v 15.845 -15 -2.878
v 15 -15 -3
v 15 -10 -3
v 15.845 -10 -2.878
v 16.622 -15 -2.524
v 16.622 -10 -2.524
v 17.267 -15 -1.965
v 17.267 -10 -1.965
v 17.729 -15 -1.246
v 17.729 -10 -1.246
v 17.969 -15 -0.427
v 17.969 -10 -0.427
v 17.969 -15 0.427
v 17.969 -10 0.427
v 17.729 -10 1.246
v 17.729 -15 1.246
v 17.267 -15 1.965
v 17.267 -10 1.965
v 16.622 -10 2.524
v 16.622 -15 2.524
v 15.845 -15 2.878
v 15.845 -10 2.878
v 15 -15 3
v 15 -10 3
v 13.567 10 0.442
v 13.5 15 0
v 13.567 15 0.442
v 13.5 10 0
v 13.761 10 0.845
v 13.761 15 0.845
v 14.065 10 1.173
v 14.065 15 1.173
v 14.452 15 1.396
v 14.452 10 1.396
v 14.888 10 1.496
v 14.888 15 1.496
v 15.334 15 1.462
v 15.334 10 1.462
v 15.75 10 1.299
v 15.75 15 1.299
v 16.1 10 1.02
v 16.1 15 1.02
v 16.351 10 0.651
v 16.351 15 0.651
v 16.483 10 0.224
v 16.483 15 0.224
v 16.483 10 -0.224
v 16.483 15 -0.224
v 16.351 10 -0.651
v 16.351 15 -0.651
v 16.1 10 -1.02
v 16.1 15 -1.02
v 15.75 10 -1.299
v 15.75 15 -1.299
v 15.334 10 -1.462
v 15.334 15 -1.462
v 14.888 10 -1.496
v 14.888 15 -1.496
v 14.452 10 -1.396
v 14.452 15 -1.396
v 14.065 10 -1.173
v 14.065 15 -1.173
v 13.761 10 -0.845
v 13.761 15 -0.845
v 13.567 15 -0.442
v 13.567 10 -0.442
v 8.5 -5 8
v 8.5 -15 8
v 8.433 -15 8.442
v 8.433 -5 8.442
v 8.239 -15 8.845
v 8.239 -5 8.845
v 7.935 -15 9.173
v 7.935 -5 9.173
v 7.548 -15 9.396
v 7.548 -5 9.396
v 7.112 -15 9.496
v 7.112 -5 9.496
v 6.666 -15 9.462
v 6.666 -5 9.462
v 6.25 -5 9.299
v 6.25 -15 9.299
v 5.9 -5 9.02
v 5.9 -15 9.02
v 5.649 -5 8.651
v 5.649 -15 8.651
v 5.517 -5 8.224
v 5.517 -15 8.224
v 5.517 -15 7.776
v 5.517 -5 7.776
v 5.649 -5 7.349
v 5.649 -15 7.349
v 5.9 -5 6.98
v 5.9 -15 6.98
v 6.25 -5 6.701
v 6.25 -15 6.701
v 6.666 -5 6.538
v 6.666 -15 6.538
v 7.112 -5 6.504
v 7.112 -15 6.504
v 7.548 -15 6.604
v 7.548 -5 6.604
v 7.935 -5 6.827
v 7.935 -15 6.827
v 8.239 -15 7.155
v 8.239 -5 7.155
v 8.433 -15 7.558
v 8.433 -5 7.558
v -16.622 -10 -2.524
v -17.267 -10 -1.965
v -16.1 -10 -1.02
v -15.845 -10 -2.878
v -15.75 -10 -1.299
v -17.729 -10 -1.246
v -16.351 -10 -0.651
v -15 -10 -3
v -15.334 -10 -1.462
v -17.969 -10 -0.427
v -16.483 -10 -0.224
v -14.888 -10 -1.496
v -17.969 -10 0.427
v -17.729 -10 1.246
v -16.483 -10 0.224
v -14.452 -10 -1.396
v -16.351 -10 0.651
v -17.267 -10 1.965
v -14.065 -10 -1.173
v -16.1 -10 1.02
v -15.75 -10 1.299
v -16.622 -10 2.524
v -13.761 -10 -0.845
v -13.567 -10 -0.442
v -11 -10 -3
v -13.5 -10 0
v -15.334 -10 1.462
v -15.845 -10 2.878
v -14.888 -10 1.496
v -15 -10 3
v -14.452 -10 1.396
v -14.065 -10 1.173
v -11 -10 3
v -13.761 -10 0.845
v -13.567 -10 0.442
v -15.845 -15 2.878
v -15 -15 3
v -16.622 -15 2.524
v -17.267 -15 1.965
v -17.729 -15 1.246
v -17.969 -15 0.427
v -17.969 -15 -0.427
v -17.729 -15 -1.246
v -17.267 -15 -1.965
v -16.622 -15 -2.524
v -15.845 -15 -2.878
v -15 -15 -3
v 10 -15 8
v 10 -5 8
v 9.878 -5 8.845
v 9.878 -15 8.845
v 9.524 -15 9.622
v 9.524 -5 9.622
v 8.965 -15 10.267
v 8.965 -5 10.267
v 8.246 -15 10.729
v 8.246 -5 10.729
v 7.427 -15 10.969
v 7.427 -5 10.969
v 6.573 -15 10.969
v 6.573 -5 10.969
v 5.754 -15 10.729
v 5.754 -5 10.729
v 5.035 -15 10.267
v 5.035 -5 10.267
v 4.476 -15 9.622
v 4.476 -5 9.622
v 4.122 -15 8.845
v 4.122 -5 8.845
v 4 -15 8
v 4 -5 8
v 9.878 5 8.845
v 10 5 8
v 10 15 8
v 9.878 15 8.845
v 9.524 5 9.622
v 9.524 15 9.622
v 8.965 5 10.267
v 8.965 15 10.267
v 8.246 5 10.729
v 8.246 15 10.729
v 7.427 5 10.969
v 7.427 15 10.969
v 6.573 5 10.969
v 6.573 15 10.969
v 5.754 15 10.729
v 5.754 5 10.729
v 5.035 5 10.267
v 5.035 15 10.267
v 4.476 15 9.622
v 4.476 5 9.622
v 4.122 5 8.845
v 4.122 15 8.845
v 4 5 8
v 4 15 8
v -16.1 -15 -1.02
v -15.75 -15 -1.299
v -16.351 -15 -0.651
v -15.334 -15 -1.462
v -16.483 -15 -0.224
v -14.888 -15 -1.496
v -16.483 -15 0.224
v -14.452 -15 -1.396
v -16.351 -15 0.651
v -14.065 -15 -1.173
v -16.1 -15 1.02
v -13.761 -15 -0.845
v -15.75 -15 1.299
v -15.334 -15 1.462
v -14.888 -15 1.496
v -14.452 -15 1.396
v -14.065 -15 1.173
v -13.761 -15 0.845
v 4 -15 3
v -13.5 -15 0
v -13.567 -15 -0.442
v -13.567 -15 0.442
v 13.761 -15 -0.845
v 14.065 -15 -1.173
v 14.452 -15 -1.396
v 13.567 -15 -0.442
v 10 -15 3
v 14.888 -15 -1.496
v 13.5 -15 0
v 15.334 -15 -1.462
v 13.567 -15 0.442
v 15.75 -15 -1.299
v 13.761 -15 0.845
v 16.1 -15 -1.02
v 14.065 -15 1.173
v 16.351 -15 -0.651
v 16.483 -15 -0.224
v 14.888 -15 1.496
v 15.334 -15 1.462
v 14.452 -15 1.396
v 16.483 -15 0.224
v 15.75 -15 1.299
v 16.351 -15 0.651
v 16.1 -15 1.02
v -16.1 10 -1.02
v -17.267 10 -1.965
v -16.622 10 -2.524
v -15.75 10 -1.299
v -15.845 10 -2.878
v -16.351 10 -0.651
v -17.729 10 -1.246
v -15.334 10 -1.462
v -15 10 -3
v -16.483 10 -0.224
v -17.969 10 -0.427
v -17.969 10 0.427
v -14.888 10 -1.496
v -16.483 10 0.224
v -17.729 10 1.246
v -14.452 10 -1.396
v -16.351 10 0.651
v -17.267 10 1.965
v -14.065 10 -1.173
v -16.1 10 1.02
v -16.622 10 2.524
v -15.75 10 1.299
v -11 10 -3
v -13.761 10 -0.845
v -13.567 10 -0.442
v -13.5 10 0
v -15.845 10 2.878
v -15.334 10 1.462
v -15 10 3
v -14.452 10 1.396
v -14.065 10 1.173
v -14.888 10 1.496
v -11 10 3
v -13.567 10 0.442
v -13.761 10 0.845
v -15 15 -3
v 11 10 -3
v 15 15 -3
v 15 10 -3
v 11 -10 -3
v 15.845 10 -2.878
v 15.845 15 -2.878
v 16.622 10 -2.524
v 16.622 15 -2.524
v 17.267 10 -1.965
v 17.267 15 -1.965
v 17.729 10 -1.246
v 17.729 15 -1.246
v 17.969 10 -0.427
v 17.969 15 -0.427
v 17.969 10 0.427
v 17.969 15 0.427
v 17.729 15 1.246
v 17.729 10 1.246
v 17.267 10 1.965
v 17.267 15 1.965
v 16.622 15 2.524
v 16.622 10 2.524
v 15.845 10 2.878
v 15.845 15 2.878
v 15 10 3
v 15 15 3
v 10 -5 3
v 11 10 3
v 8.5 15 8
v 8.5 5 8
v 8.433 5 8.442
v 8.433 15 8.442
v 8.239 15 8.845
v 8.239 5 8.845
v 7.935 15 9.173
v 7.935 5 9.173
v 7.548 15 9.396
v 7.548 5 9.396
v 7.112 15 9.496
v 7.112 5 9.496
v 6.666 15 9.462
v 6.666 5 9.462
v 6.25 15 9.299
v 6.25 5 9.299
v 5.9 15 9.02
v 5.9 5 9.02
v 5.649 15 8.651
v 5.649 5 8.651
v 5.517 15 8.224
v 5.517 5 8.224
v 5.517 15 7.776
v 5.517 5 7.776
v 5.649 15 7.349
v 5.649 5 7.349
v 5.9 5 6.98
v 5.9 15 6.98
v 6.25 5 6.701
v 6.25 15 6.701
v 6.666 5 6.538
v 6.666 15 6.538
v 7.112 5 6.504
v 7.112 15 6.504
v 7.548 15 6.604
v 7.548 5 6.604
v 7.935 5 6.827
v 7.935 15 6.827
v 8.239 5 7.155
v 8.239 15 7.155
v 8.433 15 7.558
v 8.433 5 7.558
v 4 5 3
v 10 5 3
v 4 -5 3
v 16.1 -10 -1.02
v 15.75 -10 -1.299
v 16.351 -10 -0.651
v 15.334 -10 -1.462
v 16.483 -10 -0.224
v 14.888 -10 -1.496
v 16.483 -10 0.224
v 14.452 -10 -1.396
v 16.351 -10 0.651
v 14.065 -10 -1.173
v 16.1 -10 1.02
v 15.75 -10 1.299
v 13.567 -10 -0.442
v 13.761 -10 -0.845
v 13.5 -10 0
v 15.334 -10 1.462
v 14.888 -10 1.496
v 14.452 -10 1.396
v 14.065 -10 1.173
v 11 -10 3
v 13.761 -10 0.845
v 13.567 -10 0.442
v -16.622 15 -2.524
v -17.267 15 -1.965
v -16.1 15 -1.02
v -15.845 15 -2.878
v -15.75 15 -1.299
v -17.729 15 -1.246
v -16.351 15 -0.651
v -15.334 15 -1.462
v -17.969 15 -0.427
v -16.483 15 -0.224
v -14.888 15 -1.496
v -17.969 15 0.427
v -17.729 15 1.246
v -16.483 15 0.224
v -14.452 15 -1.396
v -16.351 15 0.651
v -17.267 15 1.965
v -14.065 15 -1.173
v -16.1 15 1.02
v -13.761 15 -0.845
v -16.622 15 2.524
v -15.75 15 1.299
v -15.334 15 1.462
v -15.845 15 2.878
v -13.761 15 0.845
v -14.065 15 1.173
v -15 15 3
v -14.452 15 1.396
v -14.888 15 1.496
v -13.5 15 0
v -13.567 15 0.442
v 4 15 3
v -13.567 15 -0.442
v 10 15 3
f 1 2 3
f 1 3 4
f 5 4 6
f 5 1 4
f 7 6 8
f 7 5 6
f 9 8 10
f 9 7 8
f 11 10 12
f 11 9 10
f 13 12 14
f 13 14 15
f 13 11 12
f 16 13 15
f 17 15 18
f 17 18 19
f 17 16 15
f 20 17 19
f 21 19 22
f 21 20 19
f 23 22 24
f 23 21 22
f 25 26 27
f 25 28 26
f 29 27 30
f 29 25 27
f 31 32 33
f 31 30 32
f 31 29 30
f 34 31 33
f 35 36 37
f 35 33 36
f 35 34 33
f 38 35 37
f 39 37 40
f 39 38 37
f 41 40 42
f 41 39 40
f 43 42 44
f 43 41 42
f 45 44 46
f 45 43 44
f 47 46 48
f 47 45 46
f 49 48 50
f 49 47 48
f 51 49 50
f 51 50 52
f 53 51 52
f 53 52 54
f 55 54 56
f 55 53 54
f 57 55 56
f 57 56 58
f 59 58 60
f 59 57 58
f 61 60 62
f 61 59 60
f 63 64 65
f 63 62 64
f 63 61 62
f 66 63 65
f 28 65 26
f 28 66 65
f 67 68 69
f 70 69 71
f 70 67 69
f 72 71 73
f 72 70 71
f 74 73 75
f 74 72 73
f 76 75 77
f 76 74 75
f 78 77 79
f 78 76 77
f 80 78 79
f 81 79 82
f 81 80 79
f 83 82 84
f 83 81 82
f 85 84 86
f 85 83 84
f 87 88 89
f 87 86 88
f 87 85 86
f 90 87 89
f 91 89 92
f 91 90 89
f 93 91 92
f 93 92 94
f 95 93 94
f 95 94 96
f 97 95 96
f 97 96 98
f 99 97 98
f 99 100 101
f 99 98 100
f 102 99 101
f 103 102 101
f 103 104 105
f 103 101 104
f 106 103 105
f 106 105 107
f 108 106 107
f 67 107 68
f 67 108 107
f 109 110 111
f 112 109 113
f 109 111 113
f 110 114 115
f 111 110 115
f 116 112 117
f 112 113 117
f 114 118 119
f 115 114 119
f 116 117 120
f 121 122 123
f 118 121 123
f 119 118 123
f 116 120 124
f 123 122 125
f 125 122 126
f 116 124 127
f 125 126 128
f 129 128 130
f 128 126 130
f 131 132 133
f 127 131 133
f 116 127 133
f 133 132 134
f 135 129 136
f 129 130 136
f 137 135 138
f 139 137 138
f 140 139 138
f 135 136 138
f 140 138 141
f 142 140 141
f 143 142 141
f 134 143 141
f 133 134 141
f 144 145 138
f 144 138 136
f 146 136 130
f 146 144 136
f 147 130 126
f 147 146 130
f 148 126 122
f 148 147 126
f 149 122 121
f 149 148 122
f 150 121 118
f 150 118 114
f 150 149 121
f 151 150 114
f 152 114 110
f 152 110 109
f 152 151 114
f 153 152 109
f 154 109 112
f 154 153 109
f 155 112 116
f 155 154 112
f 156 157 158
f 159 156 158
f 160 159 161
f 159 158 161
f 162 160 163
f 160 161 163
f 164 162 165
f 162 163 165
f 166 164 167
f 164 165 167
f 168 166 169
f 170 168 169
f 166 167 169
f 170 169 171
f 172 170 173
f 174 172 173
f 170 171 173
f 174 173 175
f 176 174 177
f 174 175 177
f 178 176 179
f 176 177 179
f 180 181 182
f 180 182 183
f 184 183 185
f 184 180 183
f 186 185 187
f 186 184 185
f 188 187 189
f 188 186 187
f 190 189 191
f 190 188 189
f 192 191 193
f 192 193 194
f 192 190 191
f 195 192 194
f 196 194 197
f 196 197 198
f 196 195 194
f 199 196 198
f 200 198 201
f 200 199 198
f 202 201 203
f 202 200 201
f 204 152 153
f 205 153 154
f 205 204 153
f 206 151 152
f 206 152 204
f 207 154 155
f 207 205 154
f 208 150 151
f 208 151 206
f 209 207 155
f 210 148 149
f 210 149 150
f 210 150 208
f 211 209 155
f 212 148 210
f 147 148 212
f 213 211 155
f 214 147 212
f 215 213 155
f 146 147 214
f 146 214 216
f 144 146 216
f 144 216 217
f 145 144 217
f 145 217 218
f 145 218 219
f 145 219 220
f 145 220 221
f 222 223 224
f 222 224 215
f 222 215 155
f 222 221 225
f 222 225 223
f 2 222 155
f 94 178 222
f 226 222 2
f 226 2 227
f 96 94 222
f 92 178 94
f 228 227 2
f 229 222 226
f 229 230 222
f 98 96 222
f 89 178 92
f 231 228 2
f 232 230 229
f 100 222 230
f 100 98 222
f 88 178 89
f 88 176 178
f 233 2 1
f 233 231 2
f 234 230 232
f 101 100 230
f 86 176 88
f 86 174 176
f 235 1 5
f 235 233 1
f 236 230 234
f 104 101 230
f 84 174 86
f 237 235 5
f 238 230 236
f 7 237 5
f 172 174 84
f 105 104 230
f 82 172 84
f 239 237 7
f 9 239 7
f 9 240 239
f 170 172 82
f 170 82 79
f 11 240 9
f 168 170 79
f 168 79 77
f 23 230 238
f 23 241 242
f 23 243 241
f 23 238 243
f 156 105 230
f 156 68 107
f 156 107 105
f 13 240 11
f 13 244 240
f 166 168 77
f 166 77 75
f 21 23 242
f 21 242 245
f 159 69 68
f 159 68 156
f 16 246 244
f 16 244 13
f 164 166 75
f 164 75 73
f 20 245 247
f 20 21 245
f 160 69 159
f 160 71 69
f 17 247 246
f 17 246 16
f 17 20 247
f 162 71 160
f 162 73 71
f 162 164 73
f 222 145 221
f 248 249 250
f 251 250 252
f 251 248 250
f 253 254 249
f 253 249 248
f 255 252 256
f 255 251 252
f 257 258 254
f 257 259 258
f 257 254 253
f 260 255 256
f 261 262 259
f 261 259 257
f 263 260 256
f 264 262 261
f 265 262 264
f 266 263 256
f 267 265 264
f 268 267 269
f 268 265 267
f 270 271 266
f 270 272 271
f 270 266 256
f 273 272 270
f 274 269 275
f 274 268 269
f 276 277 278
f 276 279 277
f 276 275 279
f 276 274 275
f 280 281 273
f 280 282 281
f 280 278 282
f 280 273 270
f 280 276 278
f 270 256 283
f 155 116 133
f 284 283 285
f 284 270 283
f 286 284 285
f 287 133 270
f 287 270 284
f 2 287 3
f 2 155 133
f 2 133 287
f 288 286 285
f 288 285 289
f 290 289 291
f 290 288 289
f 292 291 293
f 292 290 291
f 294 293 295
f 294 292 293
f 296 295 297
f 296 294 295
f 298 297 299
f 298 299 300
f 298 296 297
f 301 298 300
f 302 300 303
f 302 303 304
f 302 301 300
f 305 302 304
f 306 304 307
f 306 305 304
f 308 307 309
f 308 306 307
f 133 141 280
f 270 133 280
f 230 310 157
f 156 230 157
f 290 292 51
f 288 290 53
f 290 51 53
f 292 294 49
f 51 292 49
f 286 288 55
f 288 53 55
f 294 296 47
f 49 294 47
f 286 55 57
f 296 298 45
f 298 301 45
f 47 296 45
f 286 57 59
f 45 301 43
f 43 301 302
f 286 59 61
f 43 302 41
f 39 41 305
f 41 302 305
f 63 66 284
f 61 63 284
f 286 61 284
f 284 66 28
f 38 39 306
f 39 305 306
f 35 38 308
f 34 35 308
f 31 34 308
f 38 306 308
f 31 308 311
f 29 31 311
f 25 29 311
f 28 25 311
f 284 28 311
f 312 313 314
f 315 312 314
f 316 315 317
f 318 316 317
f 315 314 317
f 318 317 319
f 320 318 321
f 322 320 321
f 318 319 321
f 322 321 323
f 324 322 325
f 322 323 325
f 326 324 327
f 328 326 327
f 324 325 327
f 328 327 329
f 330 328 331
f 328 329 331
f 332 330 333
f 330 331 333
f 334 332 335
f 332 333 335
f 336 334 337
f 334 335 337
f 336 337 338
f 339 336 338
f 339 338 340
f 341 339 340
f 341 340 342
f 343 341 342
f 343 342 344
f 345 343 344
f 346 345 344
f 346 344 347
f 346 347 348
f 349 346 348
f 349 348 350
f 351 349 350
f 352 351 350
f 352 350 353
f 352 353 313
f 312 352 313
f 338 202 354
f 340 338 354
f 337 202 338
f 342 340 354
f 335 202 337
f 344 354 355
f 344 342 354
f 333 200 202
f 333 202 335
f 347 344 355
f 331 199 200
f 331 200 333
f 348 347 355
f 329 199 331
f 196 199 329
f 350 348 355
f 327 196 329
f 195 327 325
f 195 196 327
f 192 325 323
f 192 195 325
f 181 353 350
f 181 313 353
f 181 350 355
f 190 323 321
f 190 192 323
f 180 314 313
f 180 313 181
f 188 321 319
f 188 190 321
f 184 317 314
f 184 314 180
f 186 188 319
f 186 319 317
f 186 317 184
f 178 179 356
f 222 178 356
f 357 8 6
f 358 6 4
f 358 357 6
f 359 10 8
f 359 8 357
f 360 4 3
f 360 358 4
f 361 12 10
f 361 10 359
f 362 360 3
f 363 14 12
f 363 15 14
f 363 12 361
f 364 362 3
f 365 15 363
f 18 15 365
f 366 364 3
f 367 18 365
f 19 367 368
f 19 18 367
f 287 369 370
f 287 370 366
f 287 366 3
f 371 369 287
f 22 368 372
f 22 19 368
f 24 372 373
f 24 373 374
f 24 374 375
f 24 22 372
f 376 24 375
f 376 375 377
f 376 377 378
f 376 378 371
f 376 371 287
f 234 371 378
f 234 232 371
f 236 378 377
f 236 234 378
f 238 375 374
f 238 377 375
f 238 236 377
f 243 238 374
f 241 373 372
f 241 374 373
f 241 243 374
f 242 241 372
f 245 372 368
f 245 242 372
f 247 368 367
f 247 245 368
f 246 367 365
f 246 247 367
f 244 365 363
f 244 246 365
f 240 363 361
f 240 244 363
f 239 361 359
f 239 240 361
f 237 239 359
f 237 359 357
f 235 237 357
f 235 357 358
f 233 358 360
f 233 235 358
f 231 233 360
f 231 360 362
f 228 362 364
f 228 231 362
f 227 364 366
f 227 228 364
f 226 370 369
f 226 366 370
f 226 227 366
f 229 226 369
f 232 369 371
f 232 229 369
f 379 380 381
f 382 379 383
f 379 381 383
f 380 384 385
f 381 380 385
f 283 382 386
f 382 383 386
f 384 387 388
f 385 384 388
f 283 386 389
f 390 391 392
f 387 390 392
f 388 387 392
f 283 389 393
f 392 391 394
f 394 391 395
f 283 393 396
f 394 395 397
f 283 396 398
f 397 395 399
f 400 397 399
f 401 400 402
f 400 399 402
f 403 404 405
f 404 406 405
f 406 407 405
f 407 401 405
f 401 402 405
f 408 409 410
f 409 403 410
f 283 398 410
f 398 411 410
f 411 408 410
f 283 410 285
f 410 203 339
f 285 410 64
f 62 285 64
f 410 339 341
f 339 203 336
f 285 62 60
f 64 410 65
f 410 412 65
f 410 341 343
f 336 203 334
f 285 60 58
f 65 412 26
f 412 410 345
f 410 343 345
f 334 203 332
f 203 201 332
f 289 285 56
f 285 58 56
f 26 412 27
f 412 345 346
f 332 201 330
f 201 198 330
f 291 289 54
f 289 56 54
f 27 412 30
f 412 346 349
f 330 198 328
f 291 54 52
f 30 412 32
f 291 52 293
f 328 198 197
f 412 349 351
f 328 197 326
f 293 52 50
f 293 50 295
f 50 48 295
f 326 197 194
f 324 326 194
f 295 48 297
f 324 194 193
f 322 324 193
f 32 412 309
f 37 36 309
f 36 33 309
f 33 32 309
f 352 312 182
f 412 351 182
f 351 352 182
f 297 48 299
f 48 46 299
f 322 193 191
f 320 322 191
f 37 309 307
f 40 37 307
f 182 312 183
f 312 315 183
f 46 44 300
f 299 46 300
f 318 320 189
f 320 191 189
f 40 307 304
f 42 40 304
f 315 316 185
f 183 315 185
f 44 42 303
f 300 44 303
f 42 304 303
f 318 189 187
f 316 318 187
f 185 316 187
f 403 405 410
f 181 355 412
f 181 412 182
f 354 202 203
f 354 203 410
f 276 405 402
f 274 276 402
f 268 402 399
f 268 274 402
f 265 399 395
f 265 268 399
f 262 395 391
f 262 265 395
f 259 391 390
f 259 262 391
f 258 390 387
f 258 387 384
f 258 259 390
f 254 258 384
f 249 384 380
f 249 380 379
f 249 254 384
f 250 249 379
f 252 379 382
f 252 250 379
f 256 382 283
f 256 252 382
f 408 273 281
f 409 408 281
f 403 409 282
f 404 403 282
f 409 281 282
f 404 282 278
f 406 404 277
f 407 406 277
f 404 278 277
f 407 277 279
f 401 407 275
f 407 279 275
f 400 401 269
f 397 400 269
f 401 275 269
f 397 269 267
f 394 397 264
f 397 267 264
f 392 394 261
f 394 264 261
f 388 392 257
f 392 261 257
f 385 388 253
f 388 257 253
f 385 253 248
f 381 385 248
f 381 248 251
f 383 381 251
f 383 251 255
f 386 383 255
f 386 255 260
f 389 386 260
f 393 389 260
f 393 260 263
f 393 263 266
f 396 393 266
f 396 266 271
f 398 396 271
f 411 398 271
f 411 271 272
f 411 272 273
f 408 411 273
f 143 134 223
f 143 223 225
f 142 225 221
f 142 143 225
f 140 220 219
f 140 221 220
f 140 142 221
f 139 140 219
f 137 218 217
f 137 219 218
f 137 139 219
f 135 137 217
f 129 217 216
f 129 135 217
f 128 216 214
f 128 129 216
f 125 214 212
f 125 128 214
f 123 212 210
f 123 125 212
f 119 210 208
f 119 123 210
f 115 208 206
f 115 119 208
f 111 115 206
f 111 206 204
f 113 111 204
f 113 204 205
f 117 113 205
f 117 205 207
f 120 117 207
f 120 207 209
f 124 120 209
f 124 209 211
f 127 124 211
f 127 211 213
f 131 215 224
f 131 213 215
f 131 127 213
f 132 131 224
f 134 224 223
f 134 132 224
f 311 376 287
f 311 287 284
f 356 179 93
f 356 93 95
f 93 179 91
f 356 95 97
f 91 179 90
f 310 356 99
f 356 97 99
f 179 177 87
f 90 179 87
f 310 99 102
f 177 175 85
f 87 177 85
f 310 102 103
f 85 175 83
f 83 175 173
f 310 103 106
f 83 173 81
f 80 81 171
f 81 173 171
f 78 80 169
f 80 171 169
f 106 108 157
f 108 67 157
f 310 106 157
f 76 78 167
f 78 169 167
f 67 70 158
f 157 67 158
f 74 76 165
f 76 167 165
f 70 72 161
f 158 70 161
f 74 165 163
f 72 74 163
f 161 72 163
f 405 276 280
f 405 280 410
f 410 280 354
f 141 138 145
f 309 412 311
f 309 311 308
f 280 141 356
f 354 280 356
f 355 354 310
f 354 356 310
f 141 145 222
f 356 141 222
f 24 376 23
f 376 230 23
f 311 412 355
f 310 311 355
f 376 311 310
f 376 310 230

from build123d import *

# Parameters (mm, degrees)
PAD_DEPTH            = 15
SKETCH001_W          = 7
SKETCH001_H          = 20
POCKET_DEPTH         = 97.489094
POCKET_DEPTH_BACK    = 97.489094
SKETCH002_R          = 1.5
POCKET001_DEPTH      = 109.489094
POCKET001_DEPTH_BACK = 109.489094
PAD001_DEPTH         = 10
SKETCH004_R          = 1.5
POCKET002_DEPTH      = 107.817154


with BuildPart() as part:
    # Sketch (on DatumPlane) → Pad (new body, symmetric)
    with BuildSketch(Plane.XZ):
        with BuildLine():
            ThreePointArc((-15, 3), (-18, 0), (-15, -3))
            Line((-15, -3), (15, -3))
            ThreePointArc((15, -3), (18, 0), (15, 3))
            Line((-15, 3), (15, 3))
        make_face()
    extrude(amount=PAD_DEPTH, both=True)

    # Sketch001 (on DatumPlane) → Pocket (cut, two sides)
    with BuildSketch(Plane.XY) as pocket_sk:
        with Locations((-14.5, 0)):
            Rectangle(SKETCH001_W, SKETCH001_H)
    pocket = extrude(amount=-POCKET_DEPTH, mode=Mode.SUBTRACT) + extrude(pocket_sk.sketch, amount=POCKET_DEPTH_BACK, mode=Mode.SUBTRACT)

    # Mirrored: Pocket across YZ
    add(pocket.mirror(Plane.YZ), mode=Mode.SUBTRACT)

    # Sketch002 (on DatumPlane) → Pocket001 (cut, two sides)
    with BuildSketch(Plane.XZ) as pocket001_sk:
        with Locations((-15, 0)):
            Circle(SKETCH002_R)
    pocket001 = extrude(amount=-POCKET001_DEPTH, mode=Mode.SUBTRACT) + extrude(pocket001_sk.sketch, amount=POCKET001_DEPTH_BACK, mode=Mode.SUBTRACT)

    # Mirrored001: Pocket001 across YZ
    add(pocket001.mirror(Plane.YZ), mode=Mode.SUBTRACT)

    # Sketch003 (on DatumPlane) → Pad001 (join)
    with BuildSketch(Plane.XZ.offset(5)):
        with BuildLine():
            Line((4, 8), (4, 3))
            Line((4, 3), (10, 3))
            Line((10, 3), (10, 8))
            ThreePointArc((10, 8), (7, 11), (4, 8))
        make_face()
    pad001 = extrude(amount=PAD001_DEPTH)

    # Sketch004 (on DatumPlane) → Pocket002 (cut, through all)
    with BuildSketch(Plane.XZ.offset(5)):
        with Locations((7, 8)):
            Circle(SKETCH004_R)
    pocket002 = extrude(amount=POCKET002_DEPTH, mode=Mode.SUBTRACT)

    # Mirrored002: Pad001, Pocket002 across XZ
    add(pad001.mirror(Plane.XZ))
    add(pocket002.mirror(Plane.XZ), mode=Mode.SUBTRACT)


solid = part.part
